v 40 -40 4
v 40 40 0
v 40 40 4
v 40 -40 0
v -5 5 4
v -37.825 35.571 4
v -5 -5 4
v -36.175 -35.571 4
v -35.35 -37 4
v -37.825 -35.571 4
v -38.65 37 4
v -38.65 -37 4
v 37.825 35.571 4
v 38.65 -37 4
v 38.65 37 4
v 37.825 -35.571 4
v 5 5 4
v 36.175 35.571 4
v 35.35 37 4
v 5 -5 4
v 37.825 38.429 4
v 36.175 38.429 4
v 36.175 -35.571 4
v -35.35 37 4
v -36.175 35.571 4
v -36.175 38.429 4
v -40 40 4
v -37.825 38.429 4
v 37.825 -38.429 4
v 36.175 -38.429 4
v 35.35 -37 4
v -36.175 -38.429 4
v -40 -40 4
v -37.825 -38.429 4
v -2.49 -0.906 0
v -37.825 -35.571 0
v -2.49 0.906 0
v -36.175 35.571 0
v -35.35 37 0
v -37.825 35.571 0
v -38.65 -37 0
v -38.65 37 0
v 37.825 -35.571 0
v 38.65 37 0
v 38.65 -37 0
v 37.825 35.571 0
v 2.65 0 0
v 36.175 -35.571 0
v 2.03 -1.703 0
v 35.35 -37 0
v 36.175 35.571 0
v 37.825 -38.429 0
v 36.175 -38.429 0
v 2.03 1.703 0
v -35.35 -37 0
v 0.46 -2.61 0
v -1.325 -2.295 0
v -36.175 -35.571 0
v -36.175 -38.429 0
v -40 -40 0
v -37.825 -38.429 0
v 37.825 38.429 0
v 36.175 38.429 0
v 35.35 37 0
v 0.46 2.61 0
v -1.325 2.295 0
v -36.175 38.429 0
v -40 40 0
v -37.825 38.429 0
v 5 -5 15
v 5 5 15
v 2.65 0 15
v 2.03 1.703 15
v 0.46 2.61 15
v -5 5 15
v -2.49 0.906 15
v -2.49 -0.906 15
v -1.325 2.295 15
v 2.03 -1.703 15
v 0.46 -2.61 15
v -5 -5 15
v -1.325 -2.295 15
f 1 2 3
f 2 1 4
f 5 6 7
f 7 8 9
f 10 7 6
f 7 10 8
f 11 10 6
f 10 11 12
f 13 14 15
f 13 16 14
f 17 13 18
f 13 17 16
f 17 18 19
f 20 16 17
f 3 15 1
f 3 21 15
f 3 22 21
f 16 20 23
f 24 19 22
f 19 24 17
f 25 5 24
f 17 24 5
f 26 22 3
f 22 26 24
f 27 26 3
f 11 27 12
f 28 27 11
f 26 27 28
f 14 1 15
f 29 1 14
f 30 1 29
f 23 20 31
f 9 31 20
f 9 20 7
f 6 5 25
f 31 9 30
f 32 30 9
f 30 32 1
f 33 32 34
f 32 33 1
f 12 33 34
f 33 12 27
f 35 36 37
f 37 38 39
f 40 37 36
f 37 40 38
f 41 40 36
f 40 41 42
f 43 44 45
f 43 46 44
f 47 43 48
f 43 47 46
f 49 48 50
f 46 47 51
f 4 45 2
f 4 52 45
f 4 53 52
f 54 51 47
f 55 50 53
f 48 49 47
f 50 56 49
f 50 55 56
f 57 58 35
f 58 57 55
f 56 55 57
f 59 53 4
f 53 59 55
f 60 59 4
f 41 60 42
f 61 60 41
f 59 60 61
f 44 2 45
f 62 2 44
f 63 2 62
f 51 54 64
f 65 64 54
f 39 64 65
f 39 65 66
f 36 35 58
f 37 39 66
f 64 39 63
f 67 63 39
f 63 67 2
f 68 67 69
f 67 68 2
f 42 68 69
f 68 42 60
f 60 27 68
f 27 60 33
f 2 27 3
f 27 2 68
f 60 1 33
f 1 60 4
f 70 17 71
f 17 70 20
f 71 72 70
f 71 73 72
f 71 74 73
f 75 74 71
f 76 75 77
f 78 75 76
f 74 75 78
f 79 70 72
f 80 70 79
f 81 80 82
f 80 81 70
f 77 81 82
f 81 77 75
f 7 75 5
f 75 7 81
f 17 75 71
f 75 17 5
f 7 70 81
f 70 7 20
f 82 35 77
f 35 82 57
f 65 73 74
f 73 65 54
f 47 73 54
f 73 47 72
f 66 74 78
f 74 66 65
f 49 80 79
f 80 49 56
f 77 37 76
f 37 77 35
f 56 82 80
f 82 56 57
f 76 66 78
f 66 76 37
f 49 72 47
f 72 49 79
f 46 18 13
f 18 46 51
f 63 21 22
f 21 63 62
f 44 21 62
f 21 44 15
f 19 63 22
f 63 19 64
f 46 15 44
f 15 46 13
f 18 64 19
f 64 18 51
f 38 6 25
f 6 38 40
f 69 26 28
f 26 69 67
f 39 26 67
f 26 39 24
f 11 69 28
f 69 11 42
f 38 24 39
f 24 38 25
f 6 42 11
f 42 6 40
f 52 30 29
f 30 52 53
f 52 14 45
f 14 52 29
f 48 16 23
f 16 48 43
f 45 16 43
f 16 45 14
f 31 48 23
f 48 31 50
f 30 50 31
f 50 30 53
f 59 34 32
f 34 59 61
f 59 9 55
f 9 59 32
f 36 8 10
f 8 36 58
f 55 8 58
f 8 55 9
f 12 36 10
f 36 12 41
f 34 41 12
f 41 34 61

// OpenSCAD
//vergelogohole();
//basiclogo();
//vergeBox();
//dogelogo();
hole();

module dogelogo()
{
    difference()
    {
    translate([0,8,53])
    rotate([90,0,0])
    {
    cylinder(r=45, h =9);
    translate([0,0,15])
    scale([.05,.05,.07])
    import("dogecoin.stl");
    }
    
    nohole();
}
}
module vergeBox()
{
translate([-36,-40,5])
rotate([90,0,0])
scale([1.5,1.5,1.5])
importVergeText();
box();
}

module vergeText(h, ang)
{
    
  d = h*tan(ang);
  minkowski(){
    linear_extrude(height=h*0.0001)
        import("vergetext.dxf");
    
    linear_extrude(height=h,scale=h*0.0001)
      circle(d);
    }
}
module importVergeText()
{
    import("vergetext.stl");
    }
module vergelogohole()
{
difference()
    {
basiclogo();
translate([0,-4,9])
rotate([-90,0,0])
nohole();
}}


module basiclogo()
{
scale([.14,.14,.14])
translate([-245,-150,0])    
{
linear_extrude(height=50)
import("vergeupper.dxf");
    
linear_extrude(height=150)
{ 
    intersection(){
import("vergelower.dxf");    
import("vergeupper.dxf");
}   
}
difference()
{
linear_extrude(height=150)
import("vergelower.dxf");

translate([0,0,20])
linear_extrude(height=110)
offset(-20)
import("vergelower.dxf");
}
}
translate([-13/2,0,3])
difference()
{
cube([13,20,13]);
translate([2.5,0,2.5])
cube([8,20,8]); 
}

}

module nohole()
{
difference()
{
union()
    {
standBTC();
    translate([-5.1,-5.1,0])
    cube([10.1,10.1,16]);
    cylinder(r=5.3/2, h=17.5);
    }
  //  cylinder(r=5.3/2, h=18);
    
    translate([37,37,0])
    cylinder(r=3.3/2, h=9);
    translate([-37,37,0])
    cylinder(r=3.3/2, h=9);
    translate([37,-37,0])
    cylinder(r=3.3/2, h=9);
    translate([-37,-37,0])
    cylinder(r=3.3/2, h=9);
    

}  
}
module hole()
{
difference()
{
union()
    {
standBTC();
    translate([-5,-5,0])
    cube([10,10,15]);
  //  cylinder(r=5.3/2, h=20);
    }
    cylinder(r=5.3/2, h=18);
    
    translate([37,37,0])
    cylinder(r=3.3/2, h=9);
    translate([-37,37,0])
    cylinder(r=3.3/2, h=9);
    translate([37,-37,0])
    cylinder(r=3.3/2, h=9);
    translate([-37,-37,0])
    cylinder(r=3.3/2, h=9);
    

}  
}
module standBTC()
{
translate([-40,-40,0])
cube([80,80,4]);
//coin();
}

module chamfer_text(text, font, h, ang) {
  d = h*tan(ang);
  minkowski(){
    linear_extrude(height=h*0.0001)
      offset(-d)
        text(text, font=font);
    
    linear_extrude(height=h,scale=h*0.0001)
      circle(d);
  }
}

module box()
{
difference()
{
union()
{    
difference()
{
union()    
{
difference()
{
translate([-40,-40,0])
cube([80,80,30]);
translate([-38,-38,2])
cube([76,76,30]);    
}

 translate([37,37,0])
 cylinder(r=6/2, h=30);
 translate([-37,37,0])
 cylinder(r=6/2, h=30);
 translate([37,-37,0])
 cylinder(r=6/2, h=30);
 translate([-37,-37,0])
 cylinder(r=6/2, h=30);
}
 translate([37,37,0])
 cylinder(r=3/2, h=30);
 translate([-37,37,0])
 cylinder(r=3/2, h=30);
 translate([37,-37,0])
 cylinder(r=3/2, h=30);
 translate([-37,-37,0])
 cylinder(r=3/2, h=30);



translate([-25,45,14])
rotate([90,0,0])
cylinder(r=10.5/2,h=30);
translate([25,45,14])
rotate([90,0,0])
cylinder(r=10.5/2,h=30);

}
translate([0,14,1])
nodemcumounts();
}
translate([-4.5,30,20])
cube([9,30,6]);
}
}

module nodemcumounts()
{
    translate([0,0,10])
    difference()
    {
    cube([27,48.5,20], center=true);
    cube([27,39,20], center=true);
        
    translate([20.7/2,43.6/2,0])
    cylinder(r=1.5, h=30);
    translate([20.7/2,-43.6/2,0])
    cylinder(r=1.5, h=30);
    translate([-20.7/2,-43.6/2,0])
    cylinder(r=1.5, h=30);
    translate([-20.7/2,43.6/2,0])
    cylinder(r=1.5, h=30);
    }
    
    }
